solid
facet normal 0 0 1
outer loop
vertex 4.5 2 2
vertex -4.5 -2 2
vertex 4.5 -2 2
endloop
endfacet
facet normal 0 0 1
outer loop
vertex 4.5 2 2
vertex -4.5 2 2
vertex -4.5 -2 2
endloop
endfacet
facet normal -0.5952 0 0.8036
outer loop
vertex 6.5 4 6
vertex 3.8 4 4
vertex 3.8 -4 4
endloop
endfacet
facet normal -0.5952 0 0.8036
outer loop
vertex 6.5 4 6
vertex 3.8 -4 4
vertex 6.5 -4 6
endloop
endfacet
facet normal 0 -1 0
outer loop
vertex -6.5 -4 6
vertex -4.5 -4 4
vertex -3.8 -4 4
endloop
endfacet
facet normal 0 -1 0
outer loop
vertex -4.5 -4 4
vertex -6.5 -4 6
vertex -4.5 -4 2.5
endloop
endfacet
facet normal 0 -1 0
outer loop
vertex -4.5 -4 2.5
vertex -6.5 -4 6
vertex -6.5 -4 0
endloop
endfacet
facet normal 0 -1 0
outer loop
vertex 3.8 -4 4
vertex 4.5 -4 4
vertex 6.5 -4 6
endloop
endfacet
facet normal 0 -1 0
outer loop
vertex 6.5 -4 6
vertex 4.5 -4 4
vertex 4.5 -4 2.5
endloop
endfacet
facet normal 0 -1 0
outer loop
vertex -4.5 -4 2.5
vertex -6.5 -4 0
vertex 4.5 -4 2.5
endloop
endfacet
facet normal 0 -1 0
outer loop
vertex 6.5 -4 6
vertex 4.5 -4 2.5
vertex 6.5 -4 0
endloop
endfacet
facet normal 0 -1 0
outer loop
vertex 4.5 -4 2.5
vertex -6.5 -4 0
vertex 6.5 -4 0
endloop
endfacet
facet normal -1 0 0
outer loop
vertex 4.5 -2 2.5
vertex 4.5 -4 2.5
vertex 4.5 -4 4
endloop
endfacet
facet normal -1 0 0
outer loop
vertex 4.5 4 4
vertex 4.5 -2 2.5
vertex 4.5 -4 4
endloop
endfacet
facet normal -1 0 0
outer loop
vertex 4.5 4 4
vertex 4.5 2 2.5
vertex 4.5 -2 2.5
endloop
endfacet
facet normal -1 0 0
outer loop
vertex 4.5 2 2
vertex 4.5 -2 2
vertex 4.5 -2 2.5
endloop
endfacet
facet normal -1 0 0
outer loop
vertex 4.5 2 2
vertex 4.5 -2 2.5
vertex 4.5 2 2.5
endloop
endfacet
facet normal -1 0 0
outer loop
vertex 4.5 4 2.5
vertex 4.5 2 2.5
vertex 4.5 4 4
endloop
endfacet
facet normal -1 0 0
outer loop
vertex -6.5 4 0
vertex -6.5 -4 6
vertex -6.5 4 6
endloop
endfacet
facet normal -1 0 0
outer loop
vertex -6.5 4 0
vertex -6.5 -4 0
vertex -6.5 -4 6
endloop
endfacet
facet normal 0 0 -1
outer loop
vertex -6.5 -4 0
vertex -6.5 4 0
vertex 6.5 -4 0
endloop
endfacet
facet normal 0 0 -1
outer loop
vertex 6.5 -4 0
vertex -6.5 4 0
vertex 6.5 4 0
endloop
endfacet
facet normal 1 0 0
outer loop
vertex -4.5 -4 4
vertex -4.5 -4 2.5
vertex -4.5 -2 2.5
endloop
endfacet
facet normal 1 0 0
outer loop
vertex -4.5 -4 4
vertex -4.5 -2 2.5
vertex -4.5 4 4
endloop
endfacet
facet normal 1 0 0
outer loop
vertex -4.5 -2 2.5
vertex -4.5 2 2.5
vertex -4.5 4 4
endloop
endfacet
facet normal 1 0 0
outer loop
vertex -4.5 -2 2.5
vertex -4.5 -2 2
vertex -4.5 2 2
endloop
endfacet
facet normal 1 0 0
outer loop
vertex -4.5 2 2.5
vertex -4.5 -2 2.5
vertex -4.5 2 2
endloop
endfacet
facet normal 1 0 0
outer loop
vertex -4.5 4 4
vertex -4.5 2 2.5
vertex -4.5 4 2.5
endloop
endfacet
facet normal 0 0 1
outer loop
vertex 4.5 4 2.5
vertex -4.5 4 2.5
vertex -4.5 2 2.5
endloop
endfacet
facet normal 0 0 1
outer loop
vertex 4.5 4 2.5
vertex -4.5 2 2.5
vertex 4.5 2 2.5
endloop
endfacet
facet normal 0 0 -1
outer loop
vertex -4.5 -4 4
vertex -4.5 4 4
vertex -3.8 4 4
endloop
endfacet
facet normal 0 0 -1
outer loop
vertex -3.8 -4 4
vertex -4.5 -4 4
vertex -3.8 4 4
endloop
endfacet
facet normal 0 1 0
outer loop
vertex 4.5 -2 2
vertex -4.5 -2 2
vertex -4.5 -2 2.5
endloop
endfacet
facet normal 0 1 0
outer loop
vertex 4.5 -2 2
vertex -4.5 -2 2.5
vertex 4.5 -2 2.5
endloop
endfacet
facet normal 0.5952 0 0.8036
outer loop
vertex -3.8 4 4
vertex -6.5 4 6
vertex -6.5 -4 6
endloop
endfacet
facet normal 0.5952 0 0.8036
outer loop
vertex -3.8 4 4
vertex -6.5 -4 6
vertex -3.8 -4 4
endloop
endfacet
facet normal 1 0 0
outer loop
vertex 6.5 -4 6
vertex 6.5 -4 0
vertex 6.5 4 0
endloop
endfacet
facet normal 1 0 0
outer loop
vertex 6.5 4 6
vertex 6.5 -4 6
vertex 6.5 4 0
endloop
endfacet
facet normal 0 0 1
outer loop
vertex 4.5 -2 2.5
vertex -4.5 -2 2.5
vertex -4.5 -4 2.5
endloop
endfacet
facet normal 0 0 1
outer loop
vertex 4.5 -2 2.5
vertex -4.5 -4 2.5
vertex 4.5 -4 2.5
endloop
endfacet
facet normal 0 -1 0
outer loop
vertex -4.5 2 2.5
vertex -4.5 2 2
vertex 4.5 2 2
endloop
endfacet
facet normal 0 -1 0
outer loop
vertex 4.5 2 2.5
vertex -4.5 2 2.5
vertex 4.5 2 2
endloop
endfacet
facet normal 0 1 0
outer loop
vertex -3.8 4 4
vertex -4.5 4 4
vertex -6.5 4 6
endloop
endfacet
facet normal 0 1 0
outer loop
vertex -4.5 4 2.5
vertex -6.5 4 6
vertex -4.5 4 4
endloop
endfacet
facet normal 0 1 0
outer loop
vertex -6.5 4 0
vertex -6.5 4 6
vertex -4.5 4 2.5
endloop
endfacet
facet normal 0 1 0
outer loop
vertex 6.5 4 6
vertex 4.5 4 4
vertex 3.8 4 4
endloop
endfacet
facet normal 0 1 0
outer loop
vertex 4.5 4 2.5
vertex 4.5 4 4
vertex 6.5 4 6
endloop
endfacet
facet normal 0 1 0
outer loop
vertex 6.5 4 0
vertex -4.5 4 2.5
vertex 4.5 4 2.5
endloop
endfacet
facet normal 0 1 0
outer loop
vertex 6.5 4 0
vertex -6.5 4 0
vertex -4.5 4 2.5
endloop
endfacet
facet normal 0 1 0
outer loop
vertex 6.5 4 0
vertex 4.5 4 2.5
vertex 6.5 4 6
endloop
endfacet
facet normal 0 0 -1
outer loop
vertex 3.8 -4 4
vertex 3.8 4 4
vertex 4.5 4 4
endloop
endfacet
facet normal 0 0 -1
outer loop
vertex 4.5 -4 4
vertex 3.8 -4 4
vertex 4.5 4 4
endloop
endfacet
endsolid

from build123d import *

# Parameters (mm, degrees)
F0_W     = 13
F0_H     = 8
F3_DEPTH = 2
F1_W     = 13
F1_H     = 8
F1_W_2   = 9
F1_H_2   = 4
F4_DEPTH = 4
F5_START = 2.5
F2_W     = 9
F2_H     = 2
F5_DEPTH = 1.5
F6_W     = 2.7
F6_H     = 8
F7_DEPTH = 2
F9_DEPTH = 8.001


with BuildPart() as f3:
    # F0 (on Top) → F3 (new body)
    with BuildSketch(Plane.XY):
        Rectangle(F0_W, F0_H)
    extrude(amount=F3_DEPTH)

    # F1 (on Top) → F4 (join)
    with BuildSketch(Plane.XY):
        Rectangle(F1_W, F1_H)
        Rectangle(F1_W_2, F1_H_2, mode=Mode.SUBTRACT)
    extrude(amount=F4_DEPTH)

    # F2 (on Top) → F5 (cut)
    with BuildSketch(Plane.XY.offset(F5_START)):
        with Locations((0, 3)):
            Rectangle(F2_W, F2_H)
        with Locations((0, -3)):
            Rectangle(F2_W, F2_H)
    extrude(amount=F5_DEPTH, mode=Mode.SUBTRACT)

    # F6 (on face) → F7 (join)
    with BuildSketch(Plane.XY.offset(4)):
        with Locations((-5.15, 0)):
            Rectangle(F6_W, F6_H)
        with Locations((5.15, 0)):
            Rectangle(F6_W, F6_H)
    extrude(amount=F7_DEPTH)

    # F8 (on face) → F9 (cut, through all)
    with BuildSketch(Plane.XZ.offset(4)):
        Polygon((-3.8, 6), (-6.5, 6), (-3.8, 4), align=None)
        Polygon((3.8, 4), (6.5, 6), (3.8, 6), align=None)
    extrude(amount=-F9_DEPTH, mode=Mode.SUBTRACT)


solid = f3.part
